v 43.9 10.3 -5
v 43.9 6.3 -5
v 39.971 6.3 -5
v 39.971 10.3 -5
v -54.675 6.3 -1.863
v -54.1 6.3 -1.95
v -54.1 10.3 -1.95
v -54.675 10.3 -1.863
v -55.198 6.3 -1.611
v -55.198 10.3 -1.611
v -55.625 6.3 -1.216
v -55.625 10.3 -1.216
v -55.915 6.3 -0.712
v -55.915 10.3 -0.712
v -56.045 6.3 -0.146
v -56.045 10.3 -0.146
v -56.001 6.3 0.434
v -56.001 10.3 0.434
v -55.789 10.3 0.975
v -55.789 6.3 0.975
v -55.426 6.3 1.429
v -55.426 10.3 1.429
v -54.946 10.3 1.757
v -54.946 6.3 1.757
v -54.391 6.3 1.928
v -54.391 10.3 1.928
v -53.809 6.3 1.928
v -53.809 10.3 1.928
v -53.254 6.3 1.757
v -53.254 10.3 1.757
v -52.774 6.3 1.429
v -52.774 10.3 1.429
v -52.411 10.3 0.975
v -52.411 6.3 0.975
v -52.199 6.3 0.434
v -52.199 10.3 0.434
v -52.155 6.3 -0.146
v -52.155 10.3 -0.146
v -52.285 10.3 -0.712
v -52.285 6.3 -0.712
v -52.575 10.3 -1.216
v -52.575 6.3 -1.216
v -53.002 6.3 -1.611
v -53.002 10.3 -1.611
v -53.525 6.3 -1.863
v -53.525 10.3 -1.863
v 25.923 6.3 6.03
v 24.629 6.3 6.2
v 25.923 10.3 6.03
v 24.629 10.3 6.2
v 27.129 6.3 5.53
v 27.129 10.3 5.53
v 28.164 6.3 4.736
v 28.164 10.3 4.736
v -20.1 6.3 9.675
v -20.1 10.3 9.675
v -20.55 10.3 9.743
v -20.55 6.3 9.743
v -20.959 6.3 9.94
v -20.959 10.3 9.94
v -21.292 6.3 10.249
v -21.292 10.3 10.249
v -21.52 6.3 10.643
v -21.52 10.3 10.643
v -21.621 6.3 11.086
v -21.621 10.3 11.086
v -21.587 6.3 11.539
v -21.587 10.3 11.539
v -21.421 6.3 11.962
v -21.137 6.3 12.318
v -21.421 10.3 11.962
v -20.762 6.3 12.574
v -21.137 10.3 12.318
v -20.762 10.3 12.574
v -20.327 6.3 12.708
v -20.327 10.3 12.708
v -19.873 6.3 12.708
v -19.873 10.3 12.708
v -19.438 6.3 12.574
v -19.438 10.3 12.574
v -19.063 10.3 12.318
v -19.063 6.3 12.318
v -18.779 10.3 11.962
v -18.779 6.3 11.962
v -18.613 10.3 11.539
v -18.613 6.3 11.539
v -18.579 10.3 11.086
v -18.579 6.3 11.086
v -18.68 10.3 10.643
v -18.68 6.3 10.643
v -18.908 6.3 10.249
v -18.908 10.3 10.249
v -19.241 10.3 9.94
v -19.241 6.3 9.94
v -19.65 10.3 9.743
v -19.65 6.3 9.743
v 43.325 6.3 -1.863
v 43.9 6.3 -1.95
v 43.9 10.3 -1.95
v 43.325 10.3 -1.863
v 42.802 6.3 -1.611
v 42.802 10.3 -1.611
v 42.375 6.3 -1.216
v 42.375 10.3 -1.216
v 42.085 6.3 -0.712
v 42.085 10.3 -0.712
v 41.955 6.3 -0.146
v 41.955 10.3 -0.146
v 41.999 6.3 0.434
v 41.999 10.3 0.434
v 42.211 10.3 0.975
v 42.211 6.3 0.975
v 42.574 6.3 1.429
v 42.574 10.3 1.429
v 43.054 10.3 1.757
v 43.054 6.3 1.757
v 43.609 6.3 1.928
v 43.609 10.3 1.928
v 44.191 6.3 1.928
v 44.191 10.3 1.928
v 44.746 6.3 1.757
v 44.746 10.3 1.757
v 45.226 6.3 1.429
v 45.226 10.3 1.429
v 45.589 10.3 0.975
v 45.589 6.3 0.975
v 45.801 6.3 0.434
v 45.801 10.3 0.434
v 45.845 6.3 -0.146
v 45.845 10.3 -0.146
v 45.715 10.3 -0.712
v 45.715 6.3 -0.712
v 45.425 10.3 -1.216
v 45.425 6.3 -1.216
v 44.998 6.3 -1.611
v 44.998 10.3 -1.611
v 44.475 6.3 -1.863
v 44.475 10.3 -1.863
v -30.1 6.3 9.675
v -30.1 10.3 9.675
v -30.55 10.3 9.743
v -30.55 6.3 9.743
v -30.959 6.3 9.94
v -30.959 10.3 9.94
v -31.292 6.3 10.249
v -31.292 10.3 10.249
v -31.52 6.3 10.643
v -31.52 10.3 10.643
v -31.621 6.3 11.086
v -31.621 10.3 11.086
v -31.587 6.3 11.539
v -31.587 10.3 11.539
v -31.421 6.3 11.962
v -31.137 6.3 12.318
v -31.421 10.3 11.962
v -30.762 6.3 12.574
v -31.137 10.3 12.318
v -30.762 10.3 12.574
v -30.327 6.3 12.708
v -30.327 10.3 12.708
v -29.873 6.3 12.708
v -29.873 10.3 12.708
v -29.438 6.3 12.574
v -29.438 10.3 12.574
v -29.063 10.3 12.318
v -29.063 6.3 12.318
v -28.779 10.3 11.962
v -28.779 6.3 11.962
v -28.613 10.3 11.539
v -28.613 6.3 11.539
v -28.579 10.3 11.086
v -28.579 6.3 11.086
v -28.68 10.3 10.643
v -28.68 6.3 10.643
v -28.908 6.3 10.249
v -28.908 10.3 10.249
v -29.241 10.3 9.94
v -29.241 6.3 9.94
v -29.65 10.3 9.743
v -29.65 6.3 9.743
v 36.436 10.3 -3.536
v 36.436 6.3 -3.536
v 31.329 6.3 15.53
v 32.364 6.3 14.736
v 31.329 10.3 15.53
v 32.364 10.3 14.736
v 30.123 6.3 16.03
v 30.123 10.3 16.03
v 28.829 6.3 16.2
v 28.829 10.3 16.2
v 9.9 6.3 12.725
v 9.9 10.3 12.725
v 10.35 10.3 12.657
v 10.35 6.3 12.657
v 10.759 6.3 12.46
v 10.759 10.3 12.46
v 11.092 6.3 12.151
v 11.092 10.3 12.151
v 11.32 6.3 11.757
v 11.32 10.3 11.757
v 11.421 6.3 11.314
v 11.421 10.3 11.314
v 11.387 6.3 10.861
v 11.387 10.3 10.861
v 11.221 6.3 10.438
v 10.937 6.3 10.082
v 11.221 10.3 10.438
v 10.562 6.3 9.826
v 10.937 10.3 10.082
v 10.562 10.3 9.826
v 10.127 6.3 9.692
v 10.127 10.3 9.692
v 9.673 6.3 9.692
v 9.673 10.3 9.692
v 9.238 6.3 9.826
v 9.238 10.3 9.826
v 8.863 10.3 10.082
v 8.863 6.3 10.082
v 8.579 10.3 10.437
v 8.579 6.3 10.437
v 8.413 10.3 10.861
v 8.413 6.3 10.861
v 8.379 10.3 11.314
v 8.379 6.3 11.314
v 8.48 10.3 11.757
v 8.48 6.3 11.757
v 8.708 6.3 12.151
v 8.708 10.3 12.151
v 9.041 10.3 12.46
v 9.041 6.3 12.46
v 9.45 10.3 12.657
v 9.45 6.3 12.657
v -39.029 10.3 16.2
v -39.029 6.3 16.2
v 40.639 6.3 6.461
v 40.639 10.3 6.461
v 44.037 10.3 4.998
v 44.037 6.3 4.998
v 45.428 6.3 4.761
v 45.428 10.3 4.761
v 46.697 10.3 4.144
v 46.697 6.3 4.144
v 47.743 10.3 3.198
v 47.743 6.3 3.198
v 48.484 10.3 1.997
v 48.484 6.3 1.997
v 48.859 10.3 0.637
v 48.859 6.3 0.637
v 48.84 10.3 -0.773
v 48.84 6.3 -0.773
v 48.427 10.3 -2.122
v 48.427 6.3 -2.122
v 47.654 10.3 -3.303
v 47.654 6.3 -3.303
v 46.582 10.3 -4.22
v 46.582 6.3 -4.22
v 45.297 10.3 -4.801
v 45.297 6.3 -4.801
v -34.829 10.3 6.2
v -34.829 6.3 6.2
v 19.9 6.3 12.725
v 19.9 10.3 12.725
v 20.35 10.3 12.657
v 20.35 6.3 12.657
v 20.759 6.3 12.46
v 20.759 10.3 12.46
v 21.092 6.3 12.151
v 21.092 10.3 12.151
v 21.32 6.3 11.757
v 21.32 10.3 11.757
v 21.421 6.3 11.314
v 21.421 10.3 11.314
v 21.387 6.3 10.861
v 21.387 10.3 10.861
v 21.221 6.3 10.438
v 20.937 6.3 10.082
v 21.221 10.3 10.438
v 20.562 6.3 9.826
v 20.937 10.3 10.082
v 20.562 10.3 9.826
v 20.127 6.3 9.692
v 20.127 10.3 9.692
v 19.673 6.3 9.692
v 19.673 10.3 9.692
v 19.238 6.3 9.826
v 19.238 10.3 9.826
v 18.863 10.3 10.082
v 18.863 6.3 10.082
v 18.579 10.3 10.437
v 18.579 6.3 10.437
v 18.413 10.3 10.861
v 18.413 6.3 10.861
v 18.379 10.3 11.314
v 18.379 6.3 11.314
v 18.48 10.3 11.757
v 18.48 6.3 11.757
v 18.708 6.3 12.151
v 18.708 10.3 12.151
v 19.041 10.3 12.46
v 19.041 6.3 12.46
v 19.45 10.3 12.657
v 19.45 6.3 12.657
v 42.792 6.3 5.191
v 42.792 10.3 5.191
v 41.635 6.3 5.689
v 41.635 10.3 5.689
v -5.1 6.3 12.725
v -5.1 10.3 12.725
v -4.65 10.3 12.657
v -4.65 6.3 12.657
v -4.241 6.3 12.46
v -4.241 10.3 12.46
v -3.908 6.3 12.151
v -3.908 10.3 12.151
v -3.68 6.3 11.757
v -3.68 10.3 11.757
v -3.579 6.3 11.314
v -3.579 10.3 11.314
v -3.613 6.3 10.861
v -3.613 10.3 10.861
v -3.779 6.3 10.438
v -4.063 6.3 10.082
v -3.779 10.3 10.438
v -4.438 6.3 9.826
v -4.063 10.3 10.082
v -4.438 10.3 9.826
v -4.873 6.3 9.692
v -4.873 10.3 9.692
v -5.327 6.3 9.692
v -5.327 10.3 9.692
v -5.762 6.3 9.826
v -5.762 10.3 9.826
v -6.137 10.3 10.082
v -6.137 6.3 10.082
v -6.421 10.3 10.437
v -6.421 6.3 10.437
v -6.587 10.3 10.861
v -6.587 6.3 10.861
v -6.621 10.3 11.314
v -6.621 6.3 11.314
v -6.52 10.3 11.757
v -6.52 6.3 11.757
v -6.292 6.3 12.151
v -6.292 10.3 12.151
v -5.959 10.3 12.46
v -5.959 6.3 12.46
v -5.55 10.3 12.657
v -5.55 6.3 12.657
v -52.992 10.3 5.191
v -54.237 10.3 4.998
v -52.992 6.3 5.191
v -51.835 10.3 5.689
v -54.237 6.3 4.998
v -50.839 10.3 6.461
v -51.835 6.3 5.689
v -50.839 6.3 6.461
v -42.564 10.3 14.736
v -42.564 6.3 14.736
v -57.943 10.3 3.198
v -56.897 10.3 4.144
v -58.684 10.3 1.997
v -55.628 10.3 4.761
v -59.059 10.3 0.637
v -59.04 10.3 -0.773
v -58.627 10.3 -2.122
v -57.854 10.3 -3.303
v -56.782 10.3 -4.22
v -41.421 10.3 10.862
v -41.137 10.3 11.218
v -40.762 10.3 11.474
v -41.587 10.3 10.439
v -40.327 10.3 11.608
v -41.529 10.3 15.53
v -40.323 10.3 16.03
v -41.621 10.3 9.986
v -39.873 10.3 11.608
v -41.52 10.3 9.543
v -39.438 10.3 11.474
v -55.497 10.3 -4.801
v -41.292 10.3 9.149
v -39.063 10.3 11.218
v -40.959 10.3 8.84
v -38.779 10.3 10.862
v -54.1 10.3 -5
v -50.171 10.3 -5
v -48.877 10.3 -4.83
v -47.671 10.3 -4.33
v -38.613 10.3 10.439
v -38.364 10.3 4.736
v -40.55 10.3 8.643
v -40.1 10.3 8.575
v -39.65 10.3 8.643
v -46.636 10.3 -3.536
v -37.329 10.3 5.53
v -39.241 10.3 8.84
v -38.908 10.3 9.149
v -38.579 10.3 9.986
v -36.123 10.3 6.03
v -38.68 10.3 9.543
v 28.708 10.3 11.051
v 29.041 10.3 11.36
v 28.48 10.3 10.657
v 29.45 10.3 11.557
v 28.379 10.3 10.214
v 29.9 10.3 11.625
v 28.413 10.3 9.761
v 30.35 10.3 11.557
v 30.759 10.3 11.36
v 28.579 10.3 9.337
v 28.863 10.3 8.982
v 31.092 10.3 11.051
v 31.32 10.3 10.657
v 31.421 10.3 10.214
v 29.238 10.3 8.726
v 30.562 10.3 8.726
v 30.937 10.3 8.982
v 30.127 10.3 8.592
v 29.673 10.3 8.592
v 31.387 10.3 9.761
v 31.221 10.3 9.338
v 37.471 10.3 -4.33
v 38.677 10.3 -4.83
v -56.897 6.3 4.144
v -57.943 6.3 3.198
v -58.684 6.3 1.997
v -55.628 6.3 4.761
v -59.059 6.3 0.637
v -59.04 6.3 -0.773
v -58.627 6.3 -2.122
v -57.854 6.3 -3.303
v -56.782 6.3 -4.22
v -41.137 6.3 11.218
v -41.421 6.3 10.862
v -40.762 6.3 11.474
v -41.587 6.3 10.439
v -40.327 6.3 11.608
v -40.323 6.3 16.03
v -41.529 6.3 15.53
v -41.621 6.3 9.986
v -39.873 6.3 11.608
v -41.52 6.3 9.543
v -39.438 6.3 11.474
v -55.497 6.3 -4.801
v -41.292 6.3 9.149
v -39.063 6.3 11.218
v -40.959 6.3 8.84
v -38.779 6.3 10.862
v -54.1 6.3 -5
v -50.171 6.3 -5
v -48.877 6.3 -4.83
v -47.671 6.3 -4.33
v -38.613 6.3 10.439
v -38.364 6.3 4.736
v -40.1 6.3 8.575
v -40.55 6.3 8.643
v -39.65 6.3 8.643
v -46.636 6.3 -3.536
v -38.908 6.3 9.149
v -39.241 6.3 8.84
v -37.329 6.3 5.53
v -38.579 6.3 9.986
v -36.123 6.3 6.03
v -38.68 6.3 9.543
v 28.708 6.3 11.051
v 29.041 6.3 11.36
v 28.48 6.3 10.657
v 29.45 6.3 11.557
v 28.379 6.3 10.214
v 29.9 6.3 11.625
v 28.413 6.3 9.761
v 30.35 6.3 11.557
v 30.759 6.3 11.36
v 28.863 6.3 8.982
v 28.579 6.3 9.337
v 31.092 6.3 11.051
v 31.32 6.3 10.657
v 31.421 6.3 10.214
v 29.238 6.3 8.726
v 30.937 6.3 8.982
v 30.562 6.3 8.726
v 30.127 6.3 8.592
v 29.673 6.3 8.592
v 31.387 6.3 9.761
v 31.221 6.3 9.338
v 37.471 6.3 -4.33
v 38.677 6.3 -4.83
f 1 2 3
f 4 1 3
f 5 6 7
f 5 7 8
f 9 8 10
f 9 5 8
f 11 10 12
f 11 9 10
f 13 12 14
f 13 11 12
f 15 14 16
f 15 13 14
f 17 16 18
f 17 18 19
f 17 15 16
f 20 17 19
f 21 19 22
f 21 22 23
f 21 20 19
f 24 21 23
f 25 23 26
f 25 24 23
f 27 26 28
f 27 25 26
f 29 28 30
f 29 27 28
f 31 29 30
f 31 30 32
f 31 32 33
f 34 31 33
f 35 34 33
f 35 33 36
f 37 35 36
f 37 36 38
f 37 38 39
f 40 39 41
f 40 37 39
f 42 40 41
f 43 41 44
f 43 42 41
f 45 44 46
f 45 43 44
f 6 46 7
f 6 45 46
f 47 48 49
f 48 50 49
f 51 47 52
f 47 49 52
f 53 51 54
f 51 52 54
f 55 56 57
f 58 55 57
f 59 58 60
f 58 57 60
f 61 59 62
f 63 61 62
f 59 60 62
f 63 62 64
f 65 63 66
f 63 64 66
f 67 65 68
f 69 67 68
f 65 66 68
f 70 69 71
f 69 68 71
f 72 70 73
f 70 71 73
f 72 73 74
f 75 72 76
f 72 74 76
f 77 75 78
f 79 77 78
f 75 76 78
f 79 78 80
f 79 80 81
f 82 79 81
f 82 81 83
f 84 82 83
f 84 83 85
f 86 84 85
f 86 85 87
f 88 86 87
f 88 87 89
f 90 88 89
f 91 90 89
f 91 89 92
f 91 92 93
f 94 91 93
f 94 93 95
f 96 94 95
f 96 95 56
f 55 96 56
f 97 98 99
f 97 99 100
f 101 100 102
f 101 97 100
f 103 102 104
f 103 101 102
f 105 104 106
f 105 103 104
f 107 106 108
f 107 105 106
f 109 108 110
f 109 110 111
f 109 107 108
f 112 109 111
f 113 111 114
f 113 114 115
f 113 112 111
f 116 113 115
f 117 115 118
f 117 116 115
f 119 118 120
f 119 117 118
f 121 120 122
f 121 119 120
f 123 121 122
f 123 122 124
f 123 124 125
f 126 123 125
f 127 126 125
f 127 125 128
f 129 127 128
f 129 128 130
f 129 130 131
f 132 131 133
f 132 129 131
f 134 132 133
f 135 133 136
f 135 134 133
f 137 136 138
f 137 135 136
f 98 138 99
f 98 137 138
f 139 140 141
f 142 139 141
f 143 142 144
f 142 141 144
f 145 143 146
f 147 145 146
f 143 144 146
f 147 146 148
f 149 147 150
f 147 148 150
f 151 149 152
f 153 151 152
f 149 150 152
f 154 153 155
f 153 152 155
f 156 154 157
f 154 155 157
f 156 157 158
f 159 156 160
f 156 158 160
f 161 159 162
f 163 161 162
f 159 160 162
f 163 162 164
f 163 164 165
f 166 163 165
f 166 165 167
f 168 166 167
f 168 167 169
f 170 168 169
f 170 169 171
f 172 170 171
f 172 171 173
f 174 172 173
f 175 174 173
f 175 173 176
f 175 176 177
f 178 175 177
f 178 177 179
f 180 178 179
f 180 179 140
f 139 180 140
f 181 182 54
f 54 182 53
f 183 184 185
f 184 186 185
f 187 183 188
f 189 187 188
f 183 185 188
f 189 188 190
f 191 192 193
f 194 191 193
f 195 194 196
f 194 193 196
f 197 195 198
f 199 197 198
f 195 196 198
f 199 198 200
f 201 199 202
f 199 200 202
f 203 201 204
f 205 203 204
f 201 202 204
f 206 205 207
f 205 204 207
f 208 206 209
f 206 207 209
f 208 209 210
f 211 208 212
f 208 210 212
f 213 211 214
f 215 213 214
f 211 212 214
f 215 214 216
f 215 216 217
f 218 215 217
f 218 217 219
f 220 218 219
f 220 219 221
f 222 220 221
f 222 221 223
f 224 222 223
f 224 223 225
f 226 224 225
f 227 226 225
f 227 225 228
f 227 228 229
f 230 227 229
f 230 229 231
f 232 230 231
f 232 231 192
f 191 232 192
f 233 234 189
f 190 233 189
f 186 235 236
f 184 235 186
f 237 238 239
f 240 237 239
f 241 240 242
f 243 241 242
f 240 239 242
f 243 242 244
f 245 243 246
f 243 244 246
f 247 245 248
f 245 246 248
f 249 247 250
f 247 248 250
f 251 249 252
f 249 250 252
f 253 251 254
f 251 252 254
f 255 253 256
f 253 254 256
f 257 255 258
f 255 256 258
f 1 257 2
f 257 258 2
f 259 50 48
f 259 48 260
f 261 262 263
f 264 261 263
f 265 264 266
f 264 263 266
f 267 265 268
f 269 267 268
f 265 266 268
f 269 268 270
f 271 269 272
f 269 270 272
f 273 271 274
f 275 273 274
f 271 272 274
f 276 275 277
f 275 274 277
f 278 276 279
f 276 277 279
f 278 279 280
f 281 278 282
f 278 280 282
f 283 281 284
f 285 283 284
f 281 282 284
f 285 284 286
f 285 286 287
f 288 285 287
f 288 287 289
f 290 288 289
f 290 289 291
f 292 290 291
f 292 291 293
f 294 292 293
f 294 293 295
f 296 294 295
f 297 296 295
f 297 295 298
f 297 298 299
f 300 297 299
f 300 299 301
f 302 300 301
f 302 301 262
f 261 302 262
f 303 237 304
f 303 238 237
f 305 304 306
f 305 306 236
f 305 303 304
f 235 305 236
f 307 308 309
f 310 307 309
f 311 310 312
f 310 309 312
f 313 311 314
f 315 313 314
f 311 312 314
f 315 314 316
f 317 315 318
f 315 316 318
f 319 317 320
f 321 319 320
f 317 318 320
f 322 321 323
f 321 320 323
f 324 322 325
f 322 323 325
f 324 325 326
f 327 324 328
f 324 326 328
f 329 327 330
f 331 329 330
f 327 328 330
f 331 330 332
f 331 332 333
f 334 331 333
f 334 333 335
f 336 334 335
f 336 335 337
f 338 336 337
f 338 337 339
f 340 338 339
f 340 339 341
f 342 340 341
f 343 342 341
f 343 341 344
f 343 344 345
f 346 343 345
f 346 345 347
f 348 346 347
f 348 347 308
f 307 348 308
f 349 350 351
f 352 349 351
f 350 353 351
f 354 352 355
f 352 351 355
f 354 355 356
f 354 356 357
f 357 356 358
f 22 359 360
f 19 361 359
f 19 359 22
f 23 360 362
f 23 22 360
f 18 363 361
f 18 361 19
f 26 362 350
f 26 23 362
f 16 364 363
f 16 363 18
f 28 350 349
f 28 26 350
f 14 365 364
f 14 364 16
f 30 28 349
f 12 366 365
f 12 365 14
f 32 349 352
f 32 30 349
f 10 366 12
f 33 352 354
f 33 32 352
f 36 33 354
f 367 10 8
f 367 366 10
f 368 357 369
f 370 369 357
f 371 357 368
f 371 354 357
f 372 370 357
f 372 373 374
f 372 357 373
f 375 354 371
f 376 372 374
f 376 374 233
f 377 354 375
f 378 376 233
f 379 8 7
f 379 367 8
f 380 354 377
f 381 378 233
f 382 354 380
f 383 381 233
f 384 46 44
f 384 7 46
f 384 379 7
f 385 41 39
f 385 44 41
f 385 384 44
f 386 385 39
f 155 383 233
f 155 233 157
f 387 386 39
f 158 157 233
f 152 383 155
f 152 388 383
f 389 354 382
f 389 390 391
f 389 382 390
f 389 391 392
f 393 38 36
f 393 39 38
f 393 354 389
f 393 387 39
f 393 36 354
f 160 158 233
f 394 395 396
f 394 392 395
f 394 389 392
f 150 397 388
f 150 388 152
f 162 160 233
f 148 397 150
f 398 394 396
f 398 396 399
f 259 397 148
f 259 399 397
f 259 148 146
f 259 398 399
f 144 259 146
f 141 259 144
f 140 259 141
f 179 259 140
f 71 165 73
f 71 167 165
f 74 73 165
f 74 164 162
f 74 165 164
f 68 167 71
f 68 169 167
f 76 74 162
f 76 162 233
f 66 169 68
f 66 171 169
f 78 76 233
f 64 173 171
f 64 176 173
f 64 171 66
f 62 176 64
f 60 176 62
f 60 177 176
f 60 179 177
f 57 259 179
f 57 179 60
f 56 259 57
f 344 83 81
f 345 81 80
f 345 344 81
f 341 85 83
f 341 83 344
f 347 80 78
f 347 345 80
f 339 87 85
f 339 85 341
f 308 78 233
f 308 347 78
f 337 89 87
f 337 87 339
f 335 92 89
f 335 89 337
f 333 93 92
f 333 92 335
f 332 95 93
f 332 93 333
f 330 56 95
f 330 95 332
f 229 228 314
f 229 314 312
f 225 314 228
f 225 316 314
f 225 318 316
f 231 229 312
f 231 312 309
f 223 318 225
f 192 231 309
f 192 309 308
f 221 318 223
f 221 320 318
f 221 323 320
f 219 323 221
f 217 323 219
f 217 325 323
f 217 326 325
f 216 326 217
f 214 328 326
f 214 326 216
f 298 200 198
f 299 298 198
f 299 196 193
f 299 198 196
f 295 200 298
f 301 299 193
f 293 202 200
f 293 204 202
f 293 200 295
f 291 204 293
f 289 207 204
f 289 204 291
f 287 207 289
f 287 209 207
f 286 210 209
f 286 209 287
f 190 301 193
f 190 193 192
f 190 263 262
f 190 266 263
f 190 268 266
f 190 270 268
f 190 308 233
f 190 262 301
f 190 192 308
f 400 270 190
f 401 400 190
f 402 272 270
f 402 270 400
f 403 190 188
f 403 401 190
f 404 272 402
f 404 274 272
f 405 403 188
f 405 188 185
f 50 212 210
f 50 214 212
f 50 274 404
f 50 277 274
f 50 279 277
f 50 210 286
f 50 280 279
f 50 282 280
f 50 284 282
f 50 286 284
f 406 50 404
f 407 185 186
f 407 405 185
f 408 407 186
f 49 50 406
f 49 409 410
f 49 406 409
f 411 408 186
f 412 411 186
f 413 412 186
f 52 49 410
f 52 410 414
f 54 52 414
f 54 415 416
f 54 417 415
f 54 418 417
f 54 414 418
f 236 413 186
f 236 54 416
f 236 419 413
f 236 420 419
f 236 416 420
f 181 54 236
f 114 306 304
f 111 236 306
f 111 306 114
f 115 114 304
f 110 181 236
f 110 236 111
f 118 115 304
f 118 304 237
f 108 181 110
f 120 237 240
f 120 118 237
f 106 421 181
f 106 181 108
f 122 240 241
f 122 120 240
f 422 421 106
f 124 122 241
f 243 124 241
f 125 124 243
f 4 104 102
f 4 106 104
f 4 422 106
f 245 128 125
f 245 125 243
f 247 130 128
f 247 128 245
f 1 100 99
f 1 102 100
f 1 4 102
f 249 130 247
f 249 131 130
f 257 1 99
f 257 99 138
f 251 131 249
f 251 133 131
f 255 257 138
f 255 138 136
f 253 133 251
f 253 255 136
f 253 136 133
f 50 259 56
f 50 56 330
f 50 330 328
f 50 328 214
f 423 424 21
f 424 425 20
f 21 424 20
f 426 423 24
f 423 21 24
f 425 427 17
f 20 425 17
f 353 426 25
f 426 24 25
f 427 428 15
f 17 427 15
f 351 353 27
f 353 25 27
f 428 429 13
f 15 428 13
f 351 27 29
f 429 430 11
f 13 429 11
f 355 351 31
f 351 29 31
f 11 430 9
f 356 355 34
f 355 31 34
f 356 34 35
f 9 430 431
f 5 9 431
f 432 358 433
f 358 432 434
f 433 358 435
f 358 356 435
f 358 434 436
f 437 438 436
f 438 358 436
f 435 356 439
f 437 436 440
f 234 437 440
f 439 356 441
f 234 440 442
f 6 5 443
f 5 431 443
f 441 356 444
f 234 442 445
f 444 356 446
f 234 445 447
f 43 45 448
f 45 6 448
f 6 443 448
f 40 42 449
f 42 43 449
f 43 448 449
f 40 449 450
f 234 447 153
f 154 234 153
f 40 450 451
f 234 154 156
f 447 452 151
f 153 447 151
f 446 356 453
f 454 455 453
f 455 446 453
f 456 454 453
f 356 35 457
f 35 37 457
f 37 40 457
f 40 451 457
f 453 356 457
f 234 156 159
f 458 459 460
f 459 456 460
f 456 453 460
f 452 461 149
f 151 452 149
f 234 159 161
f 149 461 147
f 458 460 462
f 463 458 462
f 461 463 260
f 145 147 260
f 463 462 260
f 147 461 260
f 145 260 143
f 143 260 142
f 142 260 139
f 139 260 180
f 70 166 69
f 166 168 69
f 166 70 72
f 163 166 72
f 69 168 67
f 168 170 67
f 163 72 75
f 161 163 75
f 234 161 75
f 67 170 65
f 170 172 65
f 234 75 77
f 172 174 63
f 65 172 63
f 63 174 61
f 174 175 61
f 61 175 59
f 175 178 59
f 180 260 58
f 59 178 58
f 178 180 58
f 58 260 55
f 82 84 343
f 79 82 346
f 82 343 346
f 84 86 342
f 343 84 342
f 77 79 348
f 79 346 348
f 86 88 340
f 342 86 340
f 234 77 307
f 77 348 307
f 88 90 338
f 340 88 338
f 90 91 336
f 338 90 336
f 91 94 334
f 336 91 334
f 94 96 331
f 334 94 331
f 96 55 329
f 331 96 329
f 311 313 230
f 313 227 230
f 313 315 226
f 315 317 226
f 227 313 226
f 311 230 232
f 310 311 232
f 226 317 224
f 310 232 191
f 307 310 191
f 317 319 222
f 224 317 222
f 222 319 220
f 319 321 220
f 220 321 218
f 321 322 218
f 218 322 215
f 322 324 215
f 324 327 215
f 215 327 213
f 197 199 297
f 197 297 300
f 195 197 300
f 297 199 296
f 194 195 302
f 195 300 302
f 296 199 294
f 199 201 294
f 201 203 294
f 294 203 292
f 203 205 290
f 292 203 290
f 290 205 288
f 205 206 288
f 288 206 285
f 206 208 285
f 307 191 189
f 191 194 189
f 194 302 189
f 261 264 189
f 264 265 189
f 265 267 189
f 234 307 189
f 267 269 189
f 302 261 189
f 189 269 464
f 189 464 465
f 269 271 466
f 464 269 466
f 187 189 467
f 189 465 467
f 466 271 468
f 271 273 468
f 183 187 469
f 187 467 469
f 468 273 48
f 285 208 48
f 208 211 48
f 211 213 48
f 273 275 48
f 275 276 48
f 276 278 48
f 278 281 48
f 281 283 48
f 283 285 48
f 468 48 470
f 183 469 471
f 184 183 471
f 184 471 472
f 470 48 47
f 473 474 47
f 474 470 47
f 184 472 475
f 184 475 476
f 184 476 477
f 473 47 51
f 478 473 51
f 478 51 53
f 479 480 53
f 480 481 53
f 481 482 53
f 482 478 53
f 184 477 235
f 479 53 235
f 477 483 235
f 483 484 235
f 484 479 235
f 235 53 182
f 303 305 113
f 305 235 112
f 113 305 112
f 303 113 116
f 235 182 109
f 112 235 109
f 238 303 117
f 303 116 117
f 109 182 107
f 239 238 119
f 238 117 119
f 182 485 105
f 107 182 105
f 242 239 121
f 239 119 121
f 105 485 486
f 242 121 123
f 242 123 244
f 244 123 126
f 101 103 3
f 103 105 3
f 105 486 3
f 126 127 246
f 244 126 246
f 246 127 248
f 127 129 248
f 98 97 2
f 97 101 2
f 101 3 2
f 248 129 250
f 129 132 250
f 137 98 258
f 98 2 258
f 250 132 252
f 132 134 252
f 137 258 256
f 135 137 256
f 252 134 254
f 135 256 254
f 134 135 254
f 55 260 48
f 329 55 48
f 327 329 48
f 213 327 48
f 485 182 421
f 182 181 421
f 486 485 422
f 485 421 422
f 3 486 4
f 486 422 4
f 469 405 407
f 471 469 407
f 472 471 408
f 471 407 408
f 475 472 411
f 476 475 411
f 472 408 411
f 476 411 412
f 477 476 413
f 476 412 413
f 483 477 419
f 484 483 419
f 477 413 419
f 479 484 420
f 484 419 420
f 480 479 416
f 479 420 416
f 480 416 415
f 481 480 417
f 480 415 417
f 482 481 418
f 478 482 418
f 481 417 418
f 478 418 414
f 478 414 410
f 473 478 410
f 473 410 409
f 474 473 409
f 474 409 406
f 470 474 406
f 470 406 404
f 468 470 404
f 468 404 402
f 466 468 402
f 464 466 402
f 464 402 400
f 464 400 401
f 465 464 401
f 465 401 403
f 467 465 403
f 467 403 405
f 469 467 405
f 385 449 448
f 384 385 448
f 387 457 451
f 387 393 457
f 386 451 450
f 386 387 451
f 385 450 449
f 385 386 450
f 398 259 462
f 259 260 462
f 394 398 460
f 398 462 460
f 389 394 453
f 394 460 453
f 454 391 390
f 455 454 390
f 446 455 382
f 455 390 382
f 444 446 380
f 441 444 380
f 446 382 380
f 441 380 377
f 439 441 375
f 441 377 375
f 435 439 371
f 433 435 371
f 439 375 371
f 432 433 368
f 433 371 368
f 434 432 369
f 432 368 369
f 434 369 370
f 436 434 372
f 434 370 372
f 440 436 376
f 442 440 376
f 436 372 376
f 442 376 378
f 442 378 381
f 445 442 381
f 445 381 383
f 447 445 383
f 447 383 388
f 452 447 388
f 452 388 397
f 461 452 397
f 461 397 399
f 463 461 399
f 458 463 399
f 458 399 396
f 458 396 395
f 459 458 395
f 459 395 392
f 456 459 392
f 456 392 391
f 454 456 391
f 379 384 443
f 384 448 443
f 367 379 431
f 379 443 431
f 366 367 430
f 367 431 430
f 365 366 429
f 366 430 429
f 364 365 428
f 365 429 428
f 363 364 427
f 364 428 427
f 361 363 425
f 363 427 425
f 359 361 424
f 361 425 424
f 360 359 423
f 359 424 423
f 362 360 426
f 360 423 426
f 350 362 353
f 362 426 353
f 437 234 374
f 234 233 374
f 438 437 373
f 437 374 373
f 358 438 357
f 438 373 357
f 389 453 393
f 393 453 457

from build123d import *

# Parameters (mm, degrees)
BOSS_EXTRUDE1_START = 6.3
SKETCH1_R           = 1.95
BOSS_EXTRUDE1_DEPTH = 4
CHAMFER1_SIZE       = 13
CHAMFER2_SIZE       = 13
FILLET1_R           = 5
SKETCH2_R           = 1.525
CUT_EXTRUDE1_DEPTH  = 62.410503988


with BuildPart() as part:
    # Sketch1 → Boss-Extrude1 (new body)
    with BuildSketch(Plane(origin=(0, 0, 0), x_dir=(1, 0, 0), z_dir=(0, 1, 0)).offset(BOSS_EXTRUDE1_START)):
        with BuildLine():
            Line((-54.1, -5), (-54.1, -16.2))
            Line((-54.1, -16.2), (43.9, -16.2))
            Line((43.9, -16.2), (43.9, -5))
            ThreePointArc((43.9, -5), (48.9, 0), (43.9, 5))
            Line((43.9, 5), (24.9, 5))
            Line((24.9, 5), (24.9, -6.2))
            Line((24.9, -6.2), (-35.1, -6.2))
            Line((-35.1, -6.2), (-35.1, 5))
            Line((-35.1, 5), (-54.1, 5))
            ThreePointArc((-54.1, 5), (-59.1, 0), (-54.1, -5))
        make_face()
        with Locations(Location((43.9, 0, 0), (0, 0, 90))):
            Circle(SKETCH1_R, mode=Mode.SUBTRACT)
        with Locations(Location((-54.1, 0, 0), (0, 0, 90))):
            Circle(SKETCH1_R, mode=Mode.SUBTRACT)
    extrude(amount=BOSS_EXTRUDE1_DEPTH)

    # Chamfer1
    # the kernel refuses this chamfer: 13 mm, written as the material it takes off along each edge
    with BuildSketch(Plane(origin=(24.9, -27.131878844, -5), x_dir=(0.9996219169112968, 0, -0.027495876610586358), z_dir=(0, 1, 0))) as chamfer1_piece_1_section:
        Polygon((CHAMFER1_SIZE * 0.999621916911, -CHAMFER1_SIZE * 0.0274958766106), (-CHAMFER1_SIZE * 0.0274958766106, -CHAMFER1_SIZE * 0.999621916911), (0, 0), align=None)
    chamfer1_piece_1 = extrude(amount=70.863757687, mode=Mode.PRIVATE)
    chamfer1_piece_1 = split(chamfer1_piece_1, bisect_by=Plane(origin=(29.309865353, 8.3, 6.2), z_dir=(0, 0, -1)), keep=Keep.TOP, mode=Mode.PRIVATE)
    add(chamfer1_piece_1, mode=Mode.SUBTRACT)
    with BuildSketch(Plane(origin=(-35.1, -27.131878844, -5), x_dir=(0.027495876610586424, 0, 0.9996219169112968), z_dir=(0, 1, 0))) as chamfer1_piece_2_section:
        Polygon((CHAMFER1_SIZE * 0.999621916911, -CHAMFER1_SIZE * 0.0274958766106), (-CHAMFER1_SIZE * 0.0274958766106, -CHAMFER1_SIZE * 0.999621916911), (0, 0), align=None)
    chamfer1_piece_2 = extrude(amount=70.863757687, mode=Mode.PRIVATE)
    chamfer1_piece_2 = split(chamfer1_piece_2, bisect_by=Plane(origin=(-39.509865353, 8.3, 6.2), z_dir=(0, 0, -1)), keep=Keep.TOP, mode=Mode.PRIVATE)
    add(chamfer1_piece_2, mode=Mode.SUBTRACT)

    # Chamfer2
    # the kernel refuses this chamfer: 13 mm, written as the material it takes off along each edge
    with BuildSketch(Plane(origin=(43.9, -27.131878844, 16.2), x_dir=(0.02749587661058749, 0, -0.9996219169112966), z_dir=(0, 1, 0))) as chamfer2_piece_1_section:
        Polygon((CHAMFER2_SIZE * 0.999621916911, CHAMFER2_SIZE * 0.0274958766106), (-CHAMFER2_SIZE * 0.0274958766106, CHAMFER2_SIZE * 0.999621916911), (0, 0), align=None)
    chamfer2_piece_1 = extrude(amount=70.863757687, mode=Mode.PRIVATE)
    chamfer2_piece_1 = chamfer2_piece_1 - Plane(origin=(43.9, 8.3, 0), x_dir=(0, 0, 1), z_dir=(0, -1, 0)) * Cylinder(5, 194, mode=Mode.PRIVATE)
    add(chamfer2_piece_1, mode=Mode.SUBTRACT)
    with BuildSketch(Plane(origin=(-54.1, -27.131878844, 16.2), x_dir=(-0.027495876610587482, 0, -0.9996219169112966), z_dir=(0, 1, 0))) as chamfer2_piece_2_section:
        Polygon((CHAMFER2_SIZE * 0.999621916911, -CHAMFER2_SIZE * 0.0274958766106), (-CHAMFER2_SIZE * 0.0274958766106, -CHAMFER2_SIZE * 0.999621916911), (0, 0), align=None)
    chamfer2_piece_2 = extrude(amount=70.863757687, mode=Mode.PRIVATE)
    chamfer2_piece_2 = chamfer2_piece_2 - Plane(origin=(-54.1, 8.3, 0), x_dir=(0, 0, -1), z_dir=(0, -1, 0)) * Cylinder(5, 194, mode=Mode.PRIVATE)
    add(chamfer2_piece_2, mode=Mode.SUBTRACT)

    # Fillet1
    fillet1_edges = [part.edges().sort_by_distance(p)[0] for p in [
        (42.347223446, 8.3, 4.752776554),
        (-52.547223446, 8.3, 4.752776554),
        (37.9, 8.3, -5),
        (-48.1, 8.3, -5),
        (26.7, 8.3, 6.2),
        (-36.9, 8.3, 6.2),
        (-41.1, 8.3, 16.2),
        (30.9, 8.3, 16.2),
    ]]
    fillet(fillet1_edges, radius=FILLET1_R)

    # Sketch2 → Cut-Extrude1 (cut, through all)
    with BuildSketch(Plane(origin=(0, 10.3, 0), x_dir=(1, 0, 0), z_dir=(0, 1, 0))):
        with Locations(Location((29.9, -10.1, 0), (0, 0, 270))):
            Circle(SKETCH2_R)
        with Locations(Location((-5.1, -11.2, 0), (0, 0, 270))):
            Circle(SKETCH2_R)
        with Locations(Location((9.9, -11.2, 0), (0, 0, 270))):
            Circle(SKETCH2_R)
        with Locations(Location((-40.1, -10.1, 0), (0, 0, 90))):
            Circle(SKETCH2_R)
        with Locations(Location((-20.1, -11.2, 0), (0, 0, 90))):
            Circle(SKETCH2_R)
        with Locations(Location((19.9, -11.2, 0), (0, 0, 270))):
            Circle(SKETCH2_R)
        with Locations(Location((-30.1, -11.2, 0), (0, 0, 90))):
            Circle(SKETCH2_R)
    extrude(amount=-CUT_EXTRUDE1_DEPTH, mode=Mode.SUBTRACT)


solid = part.part
